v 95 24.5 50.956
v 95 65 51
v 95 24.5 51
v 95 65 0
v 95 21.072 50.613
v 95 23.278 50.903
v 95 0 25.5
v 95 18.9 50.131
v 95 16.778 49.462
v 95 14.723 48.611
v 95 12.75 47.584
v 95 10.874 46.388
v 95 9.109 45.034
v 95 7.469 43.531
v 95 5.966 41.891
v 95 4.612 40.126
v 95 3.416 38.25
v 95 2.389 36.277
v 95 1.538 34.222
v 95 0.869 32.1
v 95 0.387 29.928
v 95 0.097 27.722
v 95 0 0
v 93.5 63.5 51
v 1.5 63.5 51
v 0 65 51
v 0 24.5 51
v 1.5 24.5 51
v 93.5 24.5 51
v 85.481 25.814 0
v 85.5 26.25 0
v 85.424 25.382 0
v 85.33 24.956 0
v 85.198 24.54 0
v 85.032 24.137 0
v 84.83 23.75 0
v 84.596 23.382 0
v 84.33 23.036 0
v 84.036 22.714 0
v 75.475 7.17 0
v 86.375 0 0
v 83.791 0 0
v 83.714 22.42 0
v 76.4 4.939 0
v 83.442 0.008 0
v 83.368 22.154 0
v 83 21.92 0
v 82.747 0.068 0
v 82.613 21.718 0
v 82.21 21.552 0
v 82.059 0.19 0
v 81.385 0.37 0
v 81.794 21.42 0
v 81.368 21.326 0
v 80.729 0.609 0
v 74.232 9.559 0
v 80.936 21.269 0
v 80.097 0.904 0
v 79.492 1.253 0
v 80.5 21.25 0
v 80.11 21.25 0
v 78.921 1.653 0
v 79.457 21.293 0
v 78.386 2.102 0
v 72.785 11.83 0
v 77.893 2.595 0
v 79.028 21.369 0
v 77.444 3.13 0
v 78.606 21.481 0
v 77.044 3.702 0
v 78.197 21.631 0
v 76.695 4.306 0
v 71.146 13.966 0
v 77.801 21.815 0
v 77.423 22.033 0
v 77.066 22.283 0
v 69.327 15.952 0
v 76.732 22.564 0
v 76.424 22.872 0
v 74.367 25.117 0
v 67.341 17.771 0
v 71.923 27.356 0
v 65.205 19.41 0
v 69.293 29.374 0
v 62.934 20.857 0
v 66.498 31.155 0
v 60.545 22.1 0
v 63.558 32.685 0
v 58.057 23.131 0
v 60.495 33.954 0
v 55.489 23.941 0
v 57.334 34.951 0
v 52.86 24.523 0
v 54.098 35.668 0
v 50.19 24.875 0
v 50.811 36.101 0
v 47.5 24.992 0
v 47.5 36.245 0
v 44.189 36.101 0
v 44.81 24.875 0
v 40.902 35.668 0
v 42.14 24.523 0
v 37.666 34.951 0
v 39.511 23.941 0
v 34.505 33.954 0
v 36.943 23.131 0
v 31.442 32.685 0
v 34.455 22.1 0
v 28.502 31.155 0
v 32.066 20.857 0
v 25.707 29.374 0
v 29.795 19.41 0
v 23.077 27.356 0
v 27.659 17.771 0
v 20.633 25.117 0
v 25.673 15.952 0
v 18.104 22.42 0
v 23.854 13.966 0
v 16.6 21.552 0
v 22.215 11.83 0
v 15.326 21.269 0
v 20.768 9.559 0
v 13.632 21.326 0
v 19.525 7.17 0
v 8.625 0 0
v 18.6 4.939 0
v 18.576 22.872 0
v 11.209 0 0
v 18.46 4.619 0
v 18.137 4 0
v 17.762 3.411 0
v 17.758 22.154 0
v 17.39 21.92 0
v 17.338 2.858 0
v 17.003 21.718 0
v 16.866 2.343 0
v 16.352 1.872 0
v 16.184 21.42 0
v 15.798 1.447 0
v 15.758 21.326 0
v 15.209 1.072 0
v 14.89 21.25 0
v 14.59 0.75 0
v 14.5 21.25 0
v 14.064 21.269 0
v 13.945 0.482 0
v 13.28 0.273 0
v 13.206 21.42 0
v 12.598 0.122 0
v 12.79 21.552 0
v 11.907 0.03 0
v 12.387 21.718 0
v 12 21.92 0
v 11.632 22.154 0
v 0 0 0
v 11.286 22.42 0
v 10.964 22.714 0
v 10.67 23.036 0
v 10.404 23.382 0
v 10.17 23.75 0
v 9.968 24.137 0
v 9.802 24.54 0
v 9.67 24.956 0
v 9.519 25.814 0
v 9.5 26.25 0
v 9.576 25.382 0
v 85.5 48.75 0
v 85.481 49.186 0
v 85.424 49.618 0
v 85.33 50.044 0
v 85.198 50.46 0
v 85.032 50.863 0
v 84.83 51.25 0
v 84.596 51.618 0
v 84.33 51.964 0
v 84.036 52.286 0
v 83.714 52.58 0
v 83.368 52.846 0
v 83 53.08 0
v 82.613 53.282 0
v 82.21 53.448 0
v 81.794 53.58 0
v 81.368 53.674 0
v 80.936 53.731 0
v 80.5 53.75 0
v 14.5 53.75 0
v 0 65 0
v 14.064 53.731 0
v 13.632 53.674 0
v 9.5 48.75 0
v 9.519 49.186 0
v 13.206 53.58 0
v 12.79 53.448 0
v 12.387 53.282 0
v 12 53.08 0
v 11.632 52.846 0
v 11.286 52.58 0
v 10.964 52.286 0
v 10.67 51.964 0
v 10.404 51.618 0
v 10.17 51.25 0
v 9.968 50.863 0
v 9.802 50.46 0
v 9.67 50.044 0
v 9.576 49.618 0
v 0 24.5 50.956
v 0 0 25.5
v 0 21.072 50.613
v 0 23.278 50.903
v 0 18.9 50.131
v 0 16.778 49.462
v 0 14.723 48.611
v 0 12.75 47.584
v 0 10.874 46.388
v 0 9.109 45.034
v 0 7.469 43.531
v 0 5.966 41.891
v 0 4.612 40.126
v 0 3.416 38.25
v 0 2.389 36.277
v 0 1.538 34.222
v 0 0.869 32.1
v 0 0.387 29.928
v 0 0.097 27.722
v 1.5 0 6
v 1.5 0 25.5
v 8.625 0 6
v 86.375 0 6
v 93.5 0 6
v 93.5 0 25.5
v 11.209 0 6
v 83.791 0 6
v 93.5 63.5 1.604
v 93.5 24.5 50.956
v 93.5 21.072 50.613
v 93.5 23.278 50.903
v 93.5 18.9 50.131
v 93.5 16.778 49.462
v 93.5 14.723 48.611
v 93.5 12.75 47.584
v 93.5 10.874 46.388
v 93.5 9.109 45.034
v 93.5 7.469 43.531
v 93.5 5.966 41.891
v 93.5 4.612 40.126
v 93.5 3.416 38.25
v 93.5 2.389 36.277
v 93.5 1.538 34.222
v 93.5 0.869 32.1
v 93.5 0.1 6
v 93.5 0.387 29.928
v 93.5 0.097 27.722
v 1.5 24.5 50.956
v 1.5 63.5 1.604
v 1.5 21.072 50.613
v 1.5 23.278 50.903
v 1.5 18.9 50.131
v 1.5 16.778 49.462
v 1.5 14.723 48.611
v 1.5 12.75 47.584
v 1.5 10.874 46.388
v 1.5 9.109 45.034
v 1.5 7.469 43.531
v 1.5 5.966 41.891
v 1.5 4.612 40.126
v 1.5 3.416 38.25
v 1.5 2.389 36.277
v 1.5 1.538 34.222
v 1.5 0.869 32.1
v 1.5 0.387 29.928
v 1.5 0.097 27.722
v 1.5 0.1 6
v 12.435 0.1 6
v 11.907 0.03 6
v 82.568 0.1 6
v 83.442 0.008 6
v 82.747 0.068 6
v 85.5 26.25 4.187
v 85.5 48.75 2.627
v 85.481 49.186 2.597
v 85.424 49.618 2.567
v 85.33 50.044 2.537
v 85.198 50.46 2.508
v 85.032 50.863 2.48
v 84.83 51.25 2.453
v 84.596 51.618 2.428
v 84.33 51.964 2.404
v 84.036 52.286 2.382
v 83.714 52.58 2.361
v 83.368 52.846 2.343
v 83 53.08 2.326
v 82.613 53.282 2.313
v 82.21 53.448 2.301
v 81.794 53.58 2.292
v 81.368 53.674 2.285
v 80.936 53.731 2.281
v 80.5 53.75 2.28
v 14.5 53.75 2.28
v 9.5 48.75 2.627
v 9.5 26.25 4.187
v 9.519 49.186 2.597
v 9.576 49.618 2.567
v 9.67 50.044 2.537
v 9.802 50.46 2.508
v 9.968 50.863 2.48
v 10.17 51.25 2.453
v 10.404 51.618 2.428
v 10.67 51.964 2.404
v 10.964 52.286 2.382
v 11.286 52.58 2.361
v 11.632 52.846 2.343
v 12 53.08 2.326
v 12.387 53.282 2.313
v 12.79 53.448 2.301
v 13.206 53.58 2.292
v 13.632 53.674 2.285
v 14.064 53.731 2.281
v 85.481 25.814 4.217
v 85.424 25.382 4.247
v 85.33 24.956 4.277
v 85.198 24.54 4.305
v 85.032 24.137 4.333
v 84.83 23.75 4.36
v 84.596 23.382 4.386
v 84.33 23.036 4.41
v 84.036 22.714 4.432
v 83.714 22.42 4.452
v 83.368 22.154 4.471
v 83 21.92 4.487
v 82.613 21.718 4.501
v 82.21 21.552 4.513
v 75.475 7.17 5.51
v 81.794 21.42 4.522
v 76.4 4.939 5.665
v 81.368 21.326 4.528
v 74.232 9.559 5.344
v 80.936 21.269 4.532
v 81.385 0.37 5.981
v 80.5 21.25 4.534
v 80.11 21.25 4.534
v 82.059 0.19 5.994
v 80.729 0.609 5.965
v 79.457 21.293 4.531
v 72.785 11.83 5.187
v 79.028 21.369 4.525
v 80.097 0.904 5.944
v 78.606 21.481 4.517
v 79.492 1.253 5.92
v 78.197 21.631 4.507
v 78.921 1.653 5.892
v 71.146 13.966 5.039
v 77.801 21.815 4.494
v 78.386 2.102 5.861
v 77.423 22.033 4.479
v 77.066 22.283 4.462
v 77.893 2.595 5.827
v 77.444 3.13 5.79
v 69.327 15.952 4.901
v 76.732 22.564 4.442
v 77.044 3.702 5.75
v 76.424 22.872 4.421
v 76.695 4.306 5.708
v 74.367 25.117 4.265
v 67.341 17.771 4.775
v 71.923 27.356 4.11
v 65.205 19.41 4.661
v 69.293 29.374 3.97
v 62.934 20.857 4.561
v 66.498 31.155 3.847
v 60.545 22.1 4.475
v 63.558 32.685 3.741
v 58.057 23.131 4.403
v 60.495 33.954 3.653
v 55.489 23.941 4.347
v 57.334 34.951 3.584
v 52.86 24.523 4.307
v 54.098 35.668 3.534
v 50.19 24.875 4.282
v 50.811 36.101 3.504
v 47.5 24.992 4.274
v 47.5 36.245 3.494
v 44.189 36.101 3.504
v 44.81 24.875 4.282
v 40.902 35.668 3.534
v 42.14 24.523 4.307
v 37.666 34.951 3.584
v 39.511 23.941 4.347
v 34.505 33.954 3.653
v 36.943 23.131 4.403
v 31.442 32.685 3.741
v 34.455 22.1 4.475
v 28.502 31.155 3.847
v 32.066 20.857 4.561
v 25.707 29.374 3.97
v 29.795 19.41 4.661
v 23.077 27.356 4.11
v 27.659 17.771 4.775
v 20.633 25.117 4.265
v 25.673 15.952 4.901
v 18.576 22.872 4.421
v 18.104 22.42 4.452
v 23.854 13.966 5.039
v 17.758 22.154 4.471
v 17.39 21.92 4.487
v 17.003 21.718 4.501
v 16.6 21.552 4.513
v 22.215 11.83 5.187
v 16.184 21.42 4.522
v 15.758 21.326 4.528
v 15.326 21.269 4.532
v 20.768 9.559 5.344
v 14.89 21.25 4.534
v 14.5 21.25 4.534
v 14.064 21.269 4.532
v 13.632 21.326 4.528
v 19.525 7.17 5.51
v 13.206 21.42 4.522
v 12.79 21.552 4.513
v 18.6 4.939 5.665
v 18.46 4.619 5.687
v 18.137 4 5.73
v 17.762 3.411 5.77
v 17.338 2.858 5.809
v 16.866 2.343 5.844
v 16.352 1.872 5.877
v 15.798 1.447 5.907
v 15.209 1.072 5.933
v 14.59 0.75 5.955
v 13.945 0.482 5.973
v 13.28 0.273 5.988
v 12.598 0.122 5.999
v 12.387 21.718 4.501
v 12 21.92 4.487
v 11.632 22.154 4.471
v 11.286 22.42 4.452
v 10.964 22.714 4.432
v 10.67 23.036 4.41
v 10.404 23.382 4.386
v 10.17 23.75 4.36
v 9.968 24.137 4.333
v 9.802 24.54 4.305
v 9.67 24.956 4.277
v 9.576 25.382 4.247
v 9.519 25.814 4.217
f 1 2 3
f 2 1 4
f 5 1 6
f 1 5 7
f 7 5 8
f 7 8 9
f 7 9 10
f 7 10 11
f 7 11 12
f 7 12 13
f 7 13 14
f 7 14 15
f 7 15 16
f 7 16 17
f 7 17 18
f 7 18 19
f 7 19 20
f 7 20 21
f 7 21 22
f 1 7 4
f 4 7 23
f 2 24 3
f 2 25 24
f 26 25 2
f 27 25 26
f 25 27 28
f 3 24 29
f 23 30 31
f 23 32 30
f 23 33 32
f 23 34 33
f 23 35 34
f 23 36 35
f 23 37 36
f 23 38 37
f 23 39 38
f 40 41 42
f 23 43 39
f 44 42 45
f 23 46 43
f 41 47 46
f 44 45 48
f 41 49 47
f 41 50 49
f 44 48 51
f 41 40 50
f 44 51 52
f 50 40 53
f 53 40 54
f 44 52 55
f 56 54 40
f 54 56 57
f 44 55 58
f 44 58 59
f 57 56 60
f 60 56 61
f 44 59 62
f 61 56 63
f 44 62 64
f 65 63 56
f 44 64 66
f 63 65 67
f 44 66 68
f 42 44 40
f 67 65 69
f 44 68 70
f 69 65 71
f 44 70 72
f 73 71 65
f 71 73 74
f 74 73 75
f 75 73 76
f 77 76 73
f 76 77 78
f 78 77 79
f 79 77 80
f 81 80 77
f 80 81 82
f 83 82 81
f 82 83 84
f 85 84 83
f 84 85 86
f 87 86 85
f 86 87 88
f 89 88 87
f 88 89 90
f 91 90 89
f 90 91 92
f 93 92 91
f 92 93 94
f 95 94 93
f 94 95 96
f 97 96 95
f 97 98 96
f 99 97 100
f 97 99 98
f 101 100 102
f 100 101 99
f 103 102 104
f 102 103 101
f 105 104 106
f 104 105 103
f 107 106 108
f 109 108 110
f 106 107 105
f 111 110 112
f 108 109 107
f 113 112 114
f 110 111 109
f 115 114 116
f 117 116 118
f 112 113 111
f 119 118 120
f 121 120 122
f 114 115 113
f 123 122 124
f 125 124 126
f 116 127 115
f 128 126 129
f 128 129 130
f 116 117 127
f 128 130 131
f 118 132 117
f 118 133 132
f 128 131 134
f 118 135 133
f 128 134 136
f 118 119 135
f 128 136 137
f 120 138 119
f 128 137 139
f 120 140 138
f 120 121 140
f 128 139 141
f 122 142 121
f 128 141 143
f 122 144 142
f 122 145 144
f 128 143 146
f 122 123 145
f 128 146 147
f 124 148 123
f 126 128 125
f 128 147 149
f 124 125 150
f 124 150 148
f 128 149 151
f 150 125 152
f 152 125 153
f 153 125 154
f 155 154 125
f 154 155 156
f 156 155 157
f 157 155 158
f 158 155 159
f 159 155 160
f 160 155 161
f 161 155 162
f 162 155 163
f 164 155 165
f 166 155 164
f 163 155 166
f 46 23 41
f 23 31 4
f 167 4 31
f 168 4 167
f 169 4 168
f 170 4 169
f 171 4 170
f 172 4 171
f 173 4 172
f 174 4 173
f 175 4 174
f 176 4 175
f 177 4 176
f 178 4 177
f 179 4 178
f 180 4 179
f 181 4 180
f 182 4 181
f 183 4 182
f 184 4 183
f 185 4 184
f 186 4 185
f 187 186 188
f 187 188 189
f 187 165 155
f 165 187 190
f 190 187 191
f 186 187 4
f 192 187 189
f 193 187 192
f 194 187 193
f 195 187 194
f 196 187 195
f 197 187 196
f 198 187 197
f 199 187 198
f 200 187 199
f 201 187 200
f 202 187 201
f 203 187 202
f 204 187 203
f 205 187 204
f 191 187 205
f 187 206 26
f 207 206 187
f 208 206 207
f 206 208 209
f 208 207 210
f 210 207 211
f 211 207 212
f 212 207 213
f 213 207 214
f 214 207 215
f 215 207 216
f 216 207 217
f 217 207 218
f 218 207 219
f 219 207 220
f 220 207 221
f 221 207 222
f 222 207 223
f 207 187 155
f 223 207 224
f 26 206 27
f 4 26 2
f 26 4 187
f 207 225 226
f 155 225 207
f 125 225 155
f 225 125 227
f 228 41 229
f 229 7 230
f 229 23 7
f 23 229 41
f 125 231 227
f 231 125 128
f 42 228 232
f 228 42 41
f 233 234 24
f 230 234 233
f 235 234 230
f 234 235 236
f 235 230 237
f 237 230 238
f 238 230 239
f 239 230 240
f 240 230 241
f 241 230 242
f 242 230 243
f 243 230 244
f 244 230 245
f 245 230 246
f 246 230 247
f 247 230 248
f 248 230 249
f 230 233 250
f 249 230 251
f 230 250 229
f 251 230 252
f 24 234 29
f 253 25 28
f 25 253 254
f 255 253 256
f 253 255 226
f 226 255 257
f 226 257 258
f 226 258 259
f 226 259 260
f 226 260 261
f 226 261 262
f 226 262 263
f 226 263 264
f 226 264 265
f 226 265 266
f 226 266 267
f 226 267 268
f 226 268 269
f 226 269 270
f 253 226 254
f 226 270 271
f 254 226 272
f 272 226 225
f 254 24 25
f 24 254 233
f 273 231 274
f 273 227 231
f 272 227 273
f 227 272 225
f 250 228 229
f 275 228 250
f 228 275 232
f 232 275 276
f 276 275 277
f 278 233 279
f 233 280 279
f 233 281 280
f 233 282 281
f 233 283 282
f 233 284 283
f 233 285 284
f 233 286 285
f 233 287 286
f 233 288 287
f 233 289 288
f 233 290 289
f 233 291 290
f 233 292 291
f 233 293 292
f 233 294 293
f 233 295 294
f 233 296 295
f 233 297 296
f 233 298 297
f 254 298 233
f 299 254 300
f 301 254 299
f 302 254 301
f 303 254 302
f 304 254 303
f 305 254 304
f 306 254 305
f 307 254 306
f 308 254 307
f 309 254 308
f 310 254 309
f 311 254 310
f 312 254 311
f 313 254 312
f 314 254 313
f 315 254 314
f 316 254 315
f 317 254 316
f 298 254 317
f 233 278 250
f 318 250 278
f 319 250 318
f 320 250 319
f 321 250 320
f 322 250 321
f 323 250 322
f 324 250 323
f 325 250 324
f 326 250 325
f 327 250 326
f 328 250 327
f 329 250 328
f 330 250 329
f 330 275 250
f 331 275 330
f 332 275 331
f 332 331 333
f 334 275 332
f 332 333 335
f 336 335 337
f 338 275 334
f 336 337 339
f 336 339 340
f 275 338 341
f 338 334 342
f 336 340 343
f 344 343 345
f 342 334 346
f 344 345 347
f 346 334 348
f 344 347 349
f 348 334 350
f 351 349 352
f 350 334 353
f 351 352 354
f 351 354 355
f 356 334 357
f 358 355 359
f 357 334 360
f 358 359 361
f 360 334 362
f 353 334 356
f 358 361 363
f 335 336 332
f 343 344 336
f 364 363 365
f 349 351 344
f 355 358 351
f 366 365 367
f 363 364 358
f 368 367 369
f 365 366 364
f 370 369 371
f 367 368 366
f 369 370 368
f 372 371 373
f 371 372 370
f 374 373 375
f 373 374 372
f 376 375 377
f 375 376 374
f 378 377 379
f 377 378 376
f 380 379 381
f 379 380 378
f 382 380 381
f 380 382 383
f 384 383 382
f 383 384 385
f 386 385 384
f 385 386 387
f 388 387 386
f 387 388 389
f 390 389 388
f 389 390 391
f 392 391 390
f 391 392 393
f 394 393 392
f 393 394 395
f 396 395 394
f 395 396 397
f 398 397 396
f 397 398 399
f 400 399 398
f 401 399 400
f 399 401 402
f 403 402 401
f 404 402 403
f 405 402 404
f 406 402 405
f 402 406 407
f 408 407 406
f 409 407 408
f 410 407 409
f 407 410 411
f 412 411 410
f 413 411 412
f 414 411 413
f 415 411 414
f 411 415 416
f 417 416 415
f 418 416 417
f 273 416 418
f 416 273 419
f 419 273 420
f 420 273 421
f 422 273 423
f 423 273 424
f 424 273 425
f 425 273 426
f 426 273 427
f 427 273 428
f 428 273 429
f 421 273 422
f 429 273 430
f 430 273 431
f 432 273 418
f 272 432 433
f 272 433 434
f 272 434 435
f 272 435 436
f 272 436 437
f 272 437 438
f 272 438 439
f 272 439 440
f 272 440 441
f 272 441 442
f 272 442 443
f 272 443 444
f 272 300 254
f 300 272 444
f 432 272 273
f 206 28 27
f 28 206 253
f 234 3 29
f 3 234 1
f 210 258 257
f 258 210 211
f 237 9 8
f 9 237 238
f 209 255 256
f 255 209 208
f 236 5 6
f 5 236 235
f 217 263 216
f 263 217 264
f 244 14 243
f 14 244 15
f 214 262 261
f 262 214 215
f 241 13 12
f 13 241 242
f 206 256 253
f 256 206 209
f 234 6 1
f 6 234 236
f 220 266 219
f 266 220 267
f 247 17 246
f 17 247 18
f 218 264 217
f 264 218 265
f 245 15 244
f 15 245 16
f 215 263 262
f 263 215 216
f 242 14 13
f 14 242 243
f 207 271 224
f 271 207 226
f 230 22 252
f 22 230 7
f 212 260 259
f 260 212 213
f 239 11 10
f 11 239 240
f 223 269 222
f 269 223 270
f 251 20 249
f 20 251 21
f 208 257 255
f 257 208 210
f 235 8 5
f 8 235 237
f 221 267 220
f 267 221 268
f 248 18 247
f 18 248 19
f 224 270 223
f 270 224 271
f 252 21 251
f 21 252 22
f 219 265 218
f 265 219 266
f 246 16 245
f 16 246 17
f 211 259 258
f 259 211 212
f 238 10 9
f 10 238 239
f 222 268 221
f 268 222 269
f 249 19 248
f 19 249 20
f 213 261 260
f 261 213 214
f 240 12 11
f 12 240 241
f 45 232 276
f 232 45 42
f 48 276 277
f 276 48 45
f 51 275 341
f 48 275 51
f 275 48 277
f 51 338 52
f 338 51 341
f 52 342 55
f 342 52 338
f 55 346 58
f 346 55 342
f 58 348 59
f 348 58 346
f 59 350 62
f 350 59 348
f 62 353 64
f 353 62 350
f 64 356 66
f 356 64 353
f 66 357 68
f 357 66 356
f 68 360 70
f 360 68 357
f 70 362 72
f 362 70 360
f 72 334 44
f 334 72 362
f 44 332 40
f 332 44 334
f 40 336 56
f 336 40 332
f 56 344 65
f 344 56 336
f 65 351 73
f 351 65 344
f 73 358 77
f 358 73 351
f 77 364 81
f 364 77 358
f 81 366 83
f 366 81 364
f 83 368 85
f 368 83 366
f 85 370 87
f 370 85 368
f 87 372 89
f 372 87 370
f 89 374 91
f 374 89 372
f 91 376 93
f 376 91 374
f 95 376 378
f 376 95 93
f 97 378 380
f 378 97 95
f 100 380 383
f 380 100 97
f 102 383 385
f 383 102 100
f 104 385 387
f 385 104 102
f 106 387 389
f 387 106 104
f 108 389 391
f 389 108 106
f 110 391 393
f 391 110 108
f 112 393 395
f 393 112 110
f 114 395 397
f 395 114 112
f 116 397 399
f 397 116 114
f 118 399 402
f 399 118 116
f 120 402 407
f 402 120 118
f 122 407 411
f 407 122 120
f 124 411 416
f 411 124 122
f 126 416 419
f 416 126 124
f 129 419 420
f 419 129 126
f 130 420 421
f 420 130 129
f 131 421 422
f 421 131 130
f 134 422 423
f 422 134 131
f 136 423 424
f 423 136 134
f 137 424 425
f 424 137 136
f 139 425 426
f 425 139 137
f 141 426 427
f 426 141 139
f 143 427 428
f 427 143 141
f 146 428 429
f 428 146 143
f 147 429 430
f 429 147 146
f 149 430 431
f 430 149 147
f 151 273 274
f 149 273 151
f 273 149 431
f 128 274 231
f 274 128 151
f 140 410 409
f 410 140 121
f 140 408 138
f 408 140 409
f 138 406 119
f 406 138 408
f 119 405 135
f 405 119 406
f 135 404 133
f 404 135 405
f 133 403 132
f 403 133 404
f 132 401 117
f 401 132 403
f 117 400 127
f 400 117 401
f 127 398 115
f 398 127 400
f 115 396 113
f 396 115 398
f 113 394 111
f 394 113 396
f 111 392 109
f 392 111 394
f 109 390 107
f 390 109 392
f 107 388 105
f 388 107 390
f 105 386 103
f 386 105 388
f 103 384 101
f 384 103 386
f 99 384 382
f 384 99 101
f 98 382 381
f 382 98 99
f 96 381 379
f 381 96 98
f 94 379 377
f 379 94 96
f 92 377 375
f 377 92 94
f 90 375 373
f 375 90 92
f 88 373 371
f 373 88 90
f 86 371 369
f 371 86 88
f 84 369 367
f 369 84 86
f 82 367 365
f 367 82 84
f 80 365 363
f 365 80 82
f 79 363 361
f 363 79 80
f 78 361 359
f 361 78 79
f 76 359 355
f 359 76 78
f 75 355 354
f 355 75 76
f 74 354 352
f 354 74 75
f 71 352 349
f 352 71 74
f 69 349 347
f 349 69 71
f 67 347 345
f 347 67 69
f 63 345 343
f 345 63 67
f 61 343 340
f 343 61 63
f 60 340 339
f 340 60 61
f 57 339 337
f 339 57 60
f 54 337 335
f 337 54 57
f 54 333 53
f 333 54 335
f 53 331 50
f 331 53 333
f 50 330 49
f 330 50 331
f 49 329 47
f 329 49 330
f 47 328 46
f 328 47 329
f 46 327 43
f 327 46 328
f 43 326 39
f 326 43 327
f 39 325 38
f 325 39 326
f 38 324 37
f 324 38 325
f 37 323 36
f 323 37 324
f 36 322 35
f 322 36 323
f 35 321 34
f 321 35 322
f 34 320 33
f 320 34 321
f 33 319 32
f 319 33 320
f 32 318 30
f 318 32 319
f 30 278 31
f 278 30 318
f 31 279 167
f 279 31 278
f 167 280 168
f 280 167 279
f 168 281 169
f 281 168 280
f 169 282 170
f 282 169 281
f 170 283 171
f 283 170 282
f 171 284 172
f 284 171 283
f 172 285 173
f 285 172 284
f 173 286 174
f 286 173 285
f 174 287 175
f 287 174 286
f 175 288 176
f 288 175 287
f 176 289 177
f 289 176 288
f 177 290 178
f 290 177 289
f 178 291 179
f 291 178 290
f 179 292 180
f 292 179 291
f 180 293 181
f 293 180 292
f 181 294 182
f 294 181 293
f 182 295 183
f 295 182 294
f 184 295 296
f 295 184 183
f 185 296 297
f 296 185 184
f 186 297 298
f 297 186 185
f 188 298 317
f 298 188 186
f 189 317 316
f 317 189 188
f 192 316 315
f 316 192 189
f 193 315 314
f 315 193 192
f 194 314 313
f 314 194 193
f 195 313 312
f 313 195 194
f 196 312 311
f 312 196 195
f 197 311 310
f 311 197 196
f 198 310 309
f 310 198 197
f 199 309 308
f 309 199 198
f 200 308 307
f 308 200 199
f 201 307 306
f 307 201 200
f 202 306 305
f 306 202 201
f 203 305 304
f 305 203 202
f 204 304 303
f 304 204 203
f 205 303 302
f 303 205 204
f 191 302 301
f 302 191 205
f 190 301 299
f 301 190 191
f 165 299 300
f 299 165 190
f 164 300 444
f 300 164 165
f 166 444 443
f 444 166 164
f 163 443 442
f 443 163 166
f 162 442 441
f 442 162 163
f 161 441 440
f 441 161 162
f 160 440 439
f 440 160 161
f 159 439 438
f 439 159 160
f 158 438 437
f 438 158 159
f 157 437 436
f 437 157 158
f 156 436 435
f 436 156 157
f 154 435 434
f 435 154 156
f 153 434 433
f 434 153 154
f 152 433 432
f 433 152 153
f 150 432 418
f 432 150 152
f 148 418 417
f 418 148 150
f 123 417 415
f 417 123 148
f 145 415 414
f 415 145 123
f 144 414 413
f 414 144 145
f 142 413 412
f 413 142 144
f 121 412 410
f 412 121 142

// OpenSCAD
/* [Dimensions] */
//In mm, how wide should the holder be??
holder_width = 95; //[1:200]

//In mm, how long should the holder be??
holder_length = 65; //[1:200]

//In mm, how tall should the holder be??
holder_height = 51; //[1:100]

/* [Advanced] */
//In mm, how thick should the walls be?
thickness_of_walls = 1.5; //[1:0.1:5]

//In mm, how thick should the floor be at it's thinnest? (back of holder)
floor_thickness_low = 1.5; //[1:0.25:10]

//In mm, how far should the floor rise? (front of holder)
floor_thickness_high = 6; //[1:0.25:10]

//How much of a curve should there be at the front?
size_of_curve = "Half"; //[None, Half, Full]

/* [Finger Cutout] */
//Create a cutout for your finger at the front of the holder floor?
finger_cutout = "Yes"; //[Yes, No]

//As a percentage of the floor width, how large should the finger cutout be?
finger_size = 65; //[1:200] 
f_size = (finger_size * 0.01) * holder_width;

//In mm, how deep should the finger cutout be?
finger_depth = 25; //[1:200]

//How curved should the corners of the finger cutout be?
finger_curve = 8; //[0:100]

/* [Negative Space] */
//Create a negative space in the holder floor?
negative_space = "Yes"; //[Yes, No]

//As a percentage of the floor width, how wide should the negative space be?
negative_width = 80; //[1:100] 
n_width = (negative_width * 0.01) * holder_width;

//As a percentage of the floor length, how long should the negative space be?
negative_length = 50; //[1:100]
n_length = (negative_length * 0.01) * holder_length;

//In mm, how offset towards the back of the holder should the negative space be?
negative_offset = 5; //[0:100]

//As a percentage of the negative width, how wide should the negative curve be?
negative_circle_size = 100; //[1:200] 
n_size = (negative_circle_size * 0.01) * n_width;

//In mm, how deep should the negative curve be?
negative_circle_depth = 15; //[1:200]

//How curved should the corners of the negative be?
negative_curve = 5; //[0:100]

/* [Hidden] */
// Global resolution
$fs = 0.1;  // Don't generate smaller facets than 0.1 mm
$fa = 5;    // Don't generate larger angles than 5 degrees

// ########## Project Space #########

difference() {	
	union() {
		dh_walls(holder_width, holder_length, holder_height, thickness_of_walls);
		dh_floor(holder_width, holder_length, floor_thickness_low, floor_thickness_high);
	}
	
	if(finger_cutout == "Yes") translate([holder_width / 2, 0, 0]) dh_finger(f_size, finger_depth, finger_curve, floor_thickness_high);

	if(negative_space == "Yes"){
		translate([(holder_width - n_width) / 2, (holder_length - n_length) / 2 + negative_offset, 0]){
			dh_negative(n_width, n_length, floor_thickness_high, n_size, negative_circle_depth, negative_curve);
		}
	}

	if (size_of_curve == "Full") dh_curve_full(holder_width, holder_height);
	else if (size_of_curve == "Half") dh_curve_half(holder_width, holder_height);
}

// ############ Modules #############
module dh_walls (width, length, height, walls) {
	difference() {
		cube([holder_width, holder_length, holder_height]);
		translate([walls, - 1, -1 ])
			cube([holder_width - (walls * 2), holder_length - walls + 1, holder_height + 2]);
	}
}

module dh_floor(width, length, low, high) {
	hull() {
		translate([0, length - 0.1, 0]) cube([width, 0.1, low]);
		cube([width, 0.1, high]);
	}
}

module dh_curve_half(width, height) {
	difference(){
		translate([-1, -1, height / 2]) cube([width + 2, height / 2, height / 2 + 1]);
		translate([-2, height / 2, height / 2]) rotate([0, 90, 0]) cylinder(h = width + 4, d = height);
	}
}

module dh_curve_full(width, height) {
	difference(){
		translate([-1, -1, -1]) cube([width + 2, height, height + 2]);
		translate([-2, height, 0]) rotate([0, 90, 0]) cylinder(h = width + 4, r = height);
	}
}

module dh_negative(width, length, height, size, depth, radius) {
	half = size / 2 + radius;
	r_offset = radius * 2;

	translate([radius, radius, -1]) linear_extrude(height + 2) offset(r = radius) difference() {
		square([width - r_offset, length - r_offset]);
		translate([width / 2 - radius, depth - half, 0]) circle(d = size + r_offset);
		translate([size / 2 - radius, 0, 0])square([size + r_offset, depth - half]);
	}
}

module dh_finger(size, depth, radius, height) {
	half = size / 2 + radius;
	r_offset = radius * 2;

	translate([-r_offset - half, 0, -1]) linear_extrude(height + 2) difference() {
		translate([r_offset, -1, 0]) square([size + r_offset, depth * 1.5]);

		translate([radius, radius, 0]) offset(r = radius) difference() {
			square([size + (r_offset * 2), depth * 1.5]);
			translate([half + radius, depth - half, 0]) circle(d = size + r_offset);
			translate([radius, 0, 0]) square([size + r_offset, depth - half]);
		}
	}
}
